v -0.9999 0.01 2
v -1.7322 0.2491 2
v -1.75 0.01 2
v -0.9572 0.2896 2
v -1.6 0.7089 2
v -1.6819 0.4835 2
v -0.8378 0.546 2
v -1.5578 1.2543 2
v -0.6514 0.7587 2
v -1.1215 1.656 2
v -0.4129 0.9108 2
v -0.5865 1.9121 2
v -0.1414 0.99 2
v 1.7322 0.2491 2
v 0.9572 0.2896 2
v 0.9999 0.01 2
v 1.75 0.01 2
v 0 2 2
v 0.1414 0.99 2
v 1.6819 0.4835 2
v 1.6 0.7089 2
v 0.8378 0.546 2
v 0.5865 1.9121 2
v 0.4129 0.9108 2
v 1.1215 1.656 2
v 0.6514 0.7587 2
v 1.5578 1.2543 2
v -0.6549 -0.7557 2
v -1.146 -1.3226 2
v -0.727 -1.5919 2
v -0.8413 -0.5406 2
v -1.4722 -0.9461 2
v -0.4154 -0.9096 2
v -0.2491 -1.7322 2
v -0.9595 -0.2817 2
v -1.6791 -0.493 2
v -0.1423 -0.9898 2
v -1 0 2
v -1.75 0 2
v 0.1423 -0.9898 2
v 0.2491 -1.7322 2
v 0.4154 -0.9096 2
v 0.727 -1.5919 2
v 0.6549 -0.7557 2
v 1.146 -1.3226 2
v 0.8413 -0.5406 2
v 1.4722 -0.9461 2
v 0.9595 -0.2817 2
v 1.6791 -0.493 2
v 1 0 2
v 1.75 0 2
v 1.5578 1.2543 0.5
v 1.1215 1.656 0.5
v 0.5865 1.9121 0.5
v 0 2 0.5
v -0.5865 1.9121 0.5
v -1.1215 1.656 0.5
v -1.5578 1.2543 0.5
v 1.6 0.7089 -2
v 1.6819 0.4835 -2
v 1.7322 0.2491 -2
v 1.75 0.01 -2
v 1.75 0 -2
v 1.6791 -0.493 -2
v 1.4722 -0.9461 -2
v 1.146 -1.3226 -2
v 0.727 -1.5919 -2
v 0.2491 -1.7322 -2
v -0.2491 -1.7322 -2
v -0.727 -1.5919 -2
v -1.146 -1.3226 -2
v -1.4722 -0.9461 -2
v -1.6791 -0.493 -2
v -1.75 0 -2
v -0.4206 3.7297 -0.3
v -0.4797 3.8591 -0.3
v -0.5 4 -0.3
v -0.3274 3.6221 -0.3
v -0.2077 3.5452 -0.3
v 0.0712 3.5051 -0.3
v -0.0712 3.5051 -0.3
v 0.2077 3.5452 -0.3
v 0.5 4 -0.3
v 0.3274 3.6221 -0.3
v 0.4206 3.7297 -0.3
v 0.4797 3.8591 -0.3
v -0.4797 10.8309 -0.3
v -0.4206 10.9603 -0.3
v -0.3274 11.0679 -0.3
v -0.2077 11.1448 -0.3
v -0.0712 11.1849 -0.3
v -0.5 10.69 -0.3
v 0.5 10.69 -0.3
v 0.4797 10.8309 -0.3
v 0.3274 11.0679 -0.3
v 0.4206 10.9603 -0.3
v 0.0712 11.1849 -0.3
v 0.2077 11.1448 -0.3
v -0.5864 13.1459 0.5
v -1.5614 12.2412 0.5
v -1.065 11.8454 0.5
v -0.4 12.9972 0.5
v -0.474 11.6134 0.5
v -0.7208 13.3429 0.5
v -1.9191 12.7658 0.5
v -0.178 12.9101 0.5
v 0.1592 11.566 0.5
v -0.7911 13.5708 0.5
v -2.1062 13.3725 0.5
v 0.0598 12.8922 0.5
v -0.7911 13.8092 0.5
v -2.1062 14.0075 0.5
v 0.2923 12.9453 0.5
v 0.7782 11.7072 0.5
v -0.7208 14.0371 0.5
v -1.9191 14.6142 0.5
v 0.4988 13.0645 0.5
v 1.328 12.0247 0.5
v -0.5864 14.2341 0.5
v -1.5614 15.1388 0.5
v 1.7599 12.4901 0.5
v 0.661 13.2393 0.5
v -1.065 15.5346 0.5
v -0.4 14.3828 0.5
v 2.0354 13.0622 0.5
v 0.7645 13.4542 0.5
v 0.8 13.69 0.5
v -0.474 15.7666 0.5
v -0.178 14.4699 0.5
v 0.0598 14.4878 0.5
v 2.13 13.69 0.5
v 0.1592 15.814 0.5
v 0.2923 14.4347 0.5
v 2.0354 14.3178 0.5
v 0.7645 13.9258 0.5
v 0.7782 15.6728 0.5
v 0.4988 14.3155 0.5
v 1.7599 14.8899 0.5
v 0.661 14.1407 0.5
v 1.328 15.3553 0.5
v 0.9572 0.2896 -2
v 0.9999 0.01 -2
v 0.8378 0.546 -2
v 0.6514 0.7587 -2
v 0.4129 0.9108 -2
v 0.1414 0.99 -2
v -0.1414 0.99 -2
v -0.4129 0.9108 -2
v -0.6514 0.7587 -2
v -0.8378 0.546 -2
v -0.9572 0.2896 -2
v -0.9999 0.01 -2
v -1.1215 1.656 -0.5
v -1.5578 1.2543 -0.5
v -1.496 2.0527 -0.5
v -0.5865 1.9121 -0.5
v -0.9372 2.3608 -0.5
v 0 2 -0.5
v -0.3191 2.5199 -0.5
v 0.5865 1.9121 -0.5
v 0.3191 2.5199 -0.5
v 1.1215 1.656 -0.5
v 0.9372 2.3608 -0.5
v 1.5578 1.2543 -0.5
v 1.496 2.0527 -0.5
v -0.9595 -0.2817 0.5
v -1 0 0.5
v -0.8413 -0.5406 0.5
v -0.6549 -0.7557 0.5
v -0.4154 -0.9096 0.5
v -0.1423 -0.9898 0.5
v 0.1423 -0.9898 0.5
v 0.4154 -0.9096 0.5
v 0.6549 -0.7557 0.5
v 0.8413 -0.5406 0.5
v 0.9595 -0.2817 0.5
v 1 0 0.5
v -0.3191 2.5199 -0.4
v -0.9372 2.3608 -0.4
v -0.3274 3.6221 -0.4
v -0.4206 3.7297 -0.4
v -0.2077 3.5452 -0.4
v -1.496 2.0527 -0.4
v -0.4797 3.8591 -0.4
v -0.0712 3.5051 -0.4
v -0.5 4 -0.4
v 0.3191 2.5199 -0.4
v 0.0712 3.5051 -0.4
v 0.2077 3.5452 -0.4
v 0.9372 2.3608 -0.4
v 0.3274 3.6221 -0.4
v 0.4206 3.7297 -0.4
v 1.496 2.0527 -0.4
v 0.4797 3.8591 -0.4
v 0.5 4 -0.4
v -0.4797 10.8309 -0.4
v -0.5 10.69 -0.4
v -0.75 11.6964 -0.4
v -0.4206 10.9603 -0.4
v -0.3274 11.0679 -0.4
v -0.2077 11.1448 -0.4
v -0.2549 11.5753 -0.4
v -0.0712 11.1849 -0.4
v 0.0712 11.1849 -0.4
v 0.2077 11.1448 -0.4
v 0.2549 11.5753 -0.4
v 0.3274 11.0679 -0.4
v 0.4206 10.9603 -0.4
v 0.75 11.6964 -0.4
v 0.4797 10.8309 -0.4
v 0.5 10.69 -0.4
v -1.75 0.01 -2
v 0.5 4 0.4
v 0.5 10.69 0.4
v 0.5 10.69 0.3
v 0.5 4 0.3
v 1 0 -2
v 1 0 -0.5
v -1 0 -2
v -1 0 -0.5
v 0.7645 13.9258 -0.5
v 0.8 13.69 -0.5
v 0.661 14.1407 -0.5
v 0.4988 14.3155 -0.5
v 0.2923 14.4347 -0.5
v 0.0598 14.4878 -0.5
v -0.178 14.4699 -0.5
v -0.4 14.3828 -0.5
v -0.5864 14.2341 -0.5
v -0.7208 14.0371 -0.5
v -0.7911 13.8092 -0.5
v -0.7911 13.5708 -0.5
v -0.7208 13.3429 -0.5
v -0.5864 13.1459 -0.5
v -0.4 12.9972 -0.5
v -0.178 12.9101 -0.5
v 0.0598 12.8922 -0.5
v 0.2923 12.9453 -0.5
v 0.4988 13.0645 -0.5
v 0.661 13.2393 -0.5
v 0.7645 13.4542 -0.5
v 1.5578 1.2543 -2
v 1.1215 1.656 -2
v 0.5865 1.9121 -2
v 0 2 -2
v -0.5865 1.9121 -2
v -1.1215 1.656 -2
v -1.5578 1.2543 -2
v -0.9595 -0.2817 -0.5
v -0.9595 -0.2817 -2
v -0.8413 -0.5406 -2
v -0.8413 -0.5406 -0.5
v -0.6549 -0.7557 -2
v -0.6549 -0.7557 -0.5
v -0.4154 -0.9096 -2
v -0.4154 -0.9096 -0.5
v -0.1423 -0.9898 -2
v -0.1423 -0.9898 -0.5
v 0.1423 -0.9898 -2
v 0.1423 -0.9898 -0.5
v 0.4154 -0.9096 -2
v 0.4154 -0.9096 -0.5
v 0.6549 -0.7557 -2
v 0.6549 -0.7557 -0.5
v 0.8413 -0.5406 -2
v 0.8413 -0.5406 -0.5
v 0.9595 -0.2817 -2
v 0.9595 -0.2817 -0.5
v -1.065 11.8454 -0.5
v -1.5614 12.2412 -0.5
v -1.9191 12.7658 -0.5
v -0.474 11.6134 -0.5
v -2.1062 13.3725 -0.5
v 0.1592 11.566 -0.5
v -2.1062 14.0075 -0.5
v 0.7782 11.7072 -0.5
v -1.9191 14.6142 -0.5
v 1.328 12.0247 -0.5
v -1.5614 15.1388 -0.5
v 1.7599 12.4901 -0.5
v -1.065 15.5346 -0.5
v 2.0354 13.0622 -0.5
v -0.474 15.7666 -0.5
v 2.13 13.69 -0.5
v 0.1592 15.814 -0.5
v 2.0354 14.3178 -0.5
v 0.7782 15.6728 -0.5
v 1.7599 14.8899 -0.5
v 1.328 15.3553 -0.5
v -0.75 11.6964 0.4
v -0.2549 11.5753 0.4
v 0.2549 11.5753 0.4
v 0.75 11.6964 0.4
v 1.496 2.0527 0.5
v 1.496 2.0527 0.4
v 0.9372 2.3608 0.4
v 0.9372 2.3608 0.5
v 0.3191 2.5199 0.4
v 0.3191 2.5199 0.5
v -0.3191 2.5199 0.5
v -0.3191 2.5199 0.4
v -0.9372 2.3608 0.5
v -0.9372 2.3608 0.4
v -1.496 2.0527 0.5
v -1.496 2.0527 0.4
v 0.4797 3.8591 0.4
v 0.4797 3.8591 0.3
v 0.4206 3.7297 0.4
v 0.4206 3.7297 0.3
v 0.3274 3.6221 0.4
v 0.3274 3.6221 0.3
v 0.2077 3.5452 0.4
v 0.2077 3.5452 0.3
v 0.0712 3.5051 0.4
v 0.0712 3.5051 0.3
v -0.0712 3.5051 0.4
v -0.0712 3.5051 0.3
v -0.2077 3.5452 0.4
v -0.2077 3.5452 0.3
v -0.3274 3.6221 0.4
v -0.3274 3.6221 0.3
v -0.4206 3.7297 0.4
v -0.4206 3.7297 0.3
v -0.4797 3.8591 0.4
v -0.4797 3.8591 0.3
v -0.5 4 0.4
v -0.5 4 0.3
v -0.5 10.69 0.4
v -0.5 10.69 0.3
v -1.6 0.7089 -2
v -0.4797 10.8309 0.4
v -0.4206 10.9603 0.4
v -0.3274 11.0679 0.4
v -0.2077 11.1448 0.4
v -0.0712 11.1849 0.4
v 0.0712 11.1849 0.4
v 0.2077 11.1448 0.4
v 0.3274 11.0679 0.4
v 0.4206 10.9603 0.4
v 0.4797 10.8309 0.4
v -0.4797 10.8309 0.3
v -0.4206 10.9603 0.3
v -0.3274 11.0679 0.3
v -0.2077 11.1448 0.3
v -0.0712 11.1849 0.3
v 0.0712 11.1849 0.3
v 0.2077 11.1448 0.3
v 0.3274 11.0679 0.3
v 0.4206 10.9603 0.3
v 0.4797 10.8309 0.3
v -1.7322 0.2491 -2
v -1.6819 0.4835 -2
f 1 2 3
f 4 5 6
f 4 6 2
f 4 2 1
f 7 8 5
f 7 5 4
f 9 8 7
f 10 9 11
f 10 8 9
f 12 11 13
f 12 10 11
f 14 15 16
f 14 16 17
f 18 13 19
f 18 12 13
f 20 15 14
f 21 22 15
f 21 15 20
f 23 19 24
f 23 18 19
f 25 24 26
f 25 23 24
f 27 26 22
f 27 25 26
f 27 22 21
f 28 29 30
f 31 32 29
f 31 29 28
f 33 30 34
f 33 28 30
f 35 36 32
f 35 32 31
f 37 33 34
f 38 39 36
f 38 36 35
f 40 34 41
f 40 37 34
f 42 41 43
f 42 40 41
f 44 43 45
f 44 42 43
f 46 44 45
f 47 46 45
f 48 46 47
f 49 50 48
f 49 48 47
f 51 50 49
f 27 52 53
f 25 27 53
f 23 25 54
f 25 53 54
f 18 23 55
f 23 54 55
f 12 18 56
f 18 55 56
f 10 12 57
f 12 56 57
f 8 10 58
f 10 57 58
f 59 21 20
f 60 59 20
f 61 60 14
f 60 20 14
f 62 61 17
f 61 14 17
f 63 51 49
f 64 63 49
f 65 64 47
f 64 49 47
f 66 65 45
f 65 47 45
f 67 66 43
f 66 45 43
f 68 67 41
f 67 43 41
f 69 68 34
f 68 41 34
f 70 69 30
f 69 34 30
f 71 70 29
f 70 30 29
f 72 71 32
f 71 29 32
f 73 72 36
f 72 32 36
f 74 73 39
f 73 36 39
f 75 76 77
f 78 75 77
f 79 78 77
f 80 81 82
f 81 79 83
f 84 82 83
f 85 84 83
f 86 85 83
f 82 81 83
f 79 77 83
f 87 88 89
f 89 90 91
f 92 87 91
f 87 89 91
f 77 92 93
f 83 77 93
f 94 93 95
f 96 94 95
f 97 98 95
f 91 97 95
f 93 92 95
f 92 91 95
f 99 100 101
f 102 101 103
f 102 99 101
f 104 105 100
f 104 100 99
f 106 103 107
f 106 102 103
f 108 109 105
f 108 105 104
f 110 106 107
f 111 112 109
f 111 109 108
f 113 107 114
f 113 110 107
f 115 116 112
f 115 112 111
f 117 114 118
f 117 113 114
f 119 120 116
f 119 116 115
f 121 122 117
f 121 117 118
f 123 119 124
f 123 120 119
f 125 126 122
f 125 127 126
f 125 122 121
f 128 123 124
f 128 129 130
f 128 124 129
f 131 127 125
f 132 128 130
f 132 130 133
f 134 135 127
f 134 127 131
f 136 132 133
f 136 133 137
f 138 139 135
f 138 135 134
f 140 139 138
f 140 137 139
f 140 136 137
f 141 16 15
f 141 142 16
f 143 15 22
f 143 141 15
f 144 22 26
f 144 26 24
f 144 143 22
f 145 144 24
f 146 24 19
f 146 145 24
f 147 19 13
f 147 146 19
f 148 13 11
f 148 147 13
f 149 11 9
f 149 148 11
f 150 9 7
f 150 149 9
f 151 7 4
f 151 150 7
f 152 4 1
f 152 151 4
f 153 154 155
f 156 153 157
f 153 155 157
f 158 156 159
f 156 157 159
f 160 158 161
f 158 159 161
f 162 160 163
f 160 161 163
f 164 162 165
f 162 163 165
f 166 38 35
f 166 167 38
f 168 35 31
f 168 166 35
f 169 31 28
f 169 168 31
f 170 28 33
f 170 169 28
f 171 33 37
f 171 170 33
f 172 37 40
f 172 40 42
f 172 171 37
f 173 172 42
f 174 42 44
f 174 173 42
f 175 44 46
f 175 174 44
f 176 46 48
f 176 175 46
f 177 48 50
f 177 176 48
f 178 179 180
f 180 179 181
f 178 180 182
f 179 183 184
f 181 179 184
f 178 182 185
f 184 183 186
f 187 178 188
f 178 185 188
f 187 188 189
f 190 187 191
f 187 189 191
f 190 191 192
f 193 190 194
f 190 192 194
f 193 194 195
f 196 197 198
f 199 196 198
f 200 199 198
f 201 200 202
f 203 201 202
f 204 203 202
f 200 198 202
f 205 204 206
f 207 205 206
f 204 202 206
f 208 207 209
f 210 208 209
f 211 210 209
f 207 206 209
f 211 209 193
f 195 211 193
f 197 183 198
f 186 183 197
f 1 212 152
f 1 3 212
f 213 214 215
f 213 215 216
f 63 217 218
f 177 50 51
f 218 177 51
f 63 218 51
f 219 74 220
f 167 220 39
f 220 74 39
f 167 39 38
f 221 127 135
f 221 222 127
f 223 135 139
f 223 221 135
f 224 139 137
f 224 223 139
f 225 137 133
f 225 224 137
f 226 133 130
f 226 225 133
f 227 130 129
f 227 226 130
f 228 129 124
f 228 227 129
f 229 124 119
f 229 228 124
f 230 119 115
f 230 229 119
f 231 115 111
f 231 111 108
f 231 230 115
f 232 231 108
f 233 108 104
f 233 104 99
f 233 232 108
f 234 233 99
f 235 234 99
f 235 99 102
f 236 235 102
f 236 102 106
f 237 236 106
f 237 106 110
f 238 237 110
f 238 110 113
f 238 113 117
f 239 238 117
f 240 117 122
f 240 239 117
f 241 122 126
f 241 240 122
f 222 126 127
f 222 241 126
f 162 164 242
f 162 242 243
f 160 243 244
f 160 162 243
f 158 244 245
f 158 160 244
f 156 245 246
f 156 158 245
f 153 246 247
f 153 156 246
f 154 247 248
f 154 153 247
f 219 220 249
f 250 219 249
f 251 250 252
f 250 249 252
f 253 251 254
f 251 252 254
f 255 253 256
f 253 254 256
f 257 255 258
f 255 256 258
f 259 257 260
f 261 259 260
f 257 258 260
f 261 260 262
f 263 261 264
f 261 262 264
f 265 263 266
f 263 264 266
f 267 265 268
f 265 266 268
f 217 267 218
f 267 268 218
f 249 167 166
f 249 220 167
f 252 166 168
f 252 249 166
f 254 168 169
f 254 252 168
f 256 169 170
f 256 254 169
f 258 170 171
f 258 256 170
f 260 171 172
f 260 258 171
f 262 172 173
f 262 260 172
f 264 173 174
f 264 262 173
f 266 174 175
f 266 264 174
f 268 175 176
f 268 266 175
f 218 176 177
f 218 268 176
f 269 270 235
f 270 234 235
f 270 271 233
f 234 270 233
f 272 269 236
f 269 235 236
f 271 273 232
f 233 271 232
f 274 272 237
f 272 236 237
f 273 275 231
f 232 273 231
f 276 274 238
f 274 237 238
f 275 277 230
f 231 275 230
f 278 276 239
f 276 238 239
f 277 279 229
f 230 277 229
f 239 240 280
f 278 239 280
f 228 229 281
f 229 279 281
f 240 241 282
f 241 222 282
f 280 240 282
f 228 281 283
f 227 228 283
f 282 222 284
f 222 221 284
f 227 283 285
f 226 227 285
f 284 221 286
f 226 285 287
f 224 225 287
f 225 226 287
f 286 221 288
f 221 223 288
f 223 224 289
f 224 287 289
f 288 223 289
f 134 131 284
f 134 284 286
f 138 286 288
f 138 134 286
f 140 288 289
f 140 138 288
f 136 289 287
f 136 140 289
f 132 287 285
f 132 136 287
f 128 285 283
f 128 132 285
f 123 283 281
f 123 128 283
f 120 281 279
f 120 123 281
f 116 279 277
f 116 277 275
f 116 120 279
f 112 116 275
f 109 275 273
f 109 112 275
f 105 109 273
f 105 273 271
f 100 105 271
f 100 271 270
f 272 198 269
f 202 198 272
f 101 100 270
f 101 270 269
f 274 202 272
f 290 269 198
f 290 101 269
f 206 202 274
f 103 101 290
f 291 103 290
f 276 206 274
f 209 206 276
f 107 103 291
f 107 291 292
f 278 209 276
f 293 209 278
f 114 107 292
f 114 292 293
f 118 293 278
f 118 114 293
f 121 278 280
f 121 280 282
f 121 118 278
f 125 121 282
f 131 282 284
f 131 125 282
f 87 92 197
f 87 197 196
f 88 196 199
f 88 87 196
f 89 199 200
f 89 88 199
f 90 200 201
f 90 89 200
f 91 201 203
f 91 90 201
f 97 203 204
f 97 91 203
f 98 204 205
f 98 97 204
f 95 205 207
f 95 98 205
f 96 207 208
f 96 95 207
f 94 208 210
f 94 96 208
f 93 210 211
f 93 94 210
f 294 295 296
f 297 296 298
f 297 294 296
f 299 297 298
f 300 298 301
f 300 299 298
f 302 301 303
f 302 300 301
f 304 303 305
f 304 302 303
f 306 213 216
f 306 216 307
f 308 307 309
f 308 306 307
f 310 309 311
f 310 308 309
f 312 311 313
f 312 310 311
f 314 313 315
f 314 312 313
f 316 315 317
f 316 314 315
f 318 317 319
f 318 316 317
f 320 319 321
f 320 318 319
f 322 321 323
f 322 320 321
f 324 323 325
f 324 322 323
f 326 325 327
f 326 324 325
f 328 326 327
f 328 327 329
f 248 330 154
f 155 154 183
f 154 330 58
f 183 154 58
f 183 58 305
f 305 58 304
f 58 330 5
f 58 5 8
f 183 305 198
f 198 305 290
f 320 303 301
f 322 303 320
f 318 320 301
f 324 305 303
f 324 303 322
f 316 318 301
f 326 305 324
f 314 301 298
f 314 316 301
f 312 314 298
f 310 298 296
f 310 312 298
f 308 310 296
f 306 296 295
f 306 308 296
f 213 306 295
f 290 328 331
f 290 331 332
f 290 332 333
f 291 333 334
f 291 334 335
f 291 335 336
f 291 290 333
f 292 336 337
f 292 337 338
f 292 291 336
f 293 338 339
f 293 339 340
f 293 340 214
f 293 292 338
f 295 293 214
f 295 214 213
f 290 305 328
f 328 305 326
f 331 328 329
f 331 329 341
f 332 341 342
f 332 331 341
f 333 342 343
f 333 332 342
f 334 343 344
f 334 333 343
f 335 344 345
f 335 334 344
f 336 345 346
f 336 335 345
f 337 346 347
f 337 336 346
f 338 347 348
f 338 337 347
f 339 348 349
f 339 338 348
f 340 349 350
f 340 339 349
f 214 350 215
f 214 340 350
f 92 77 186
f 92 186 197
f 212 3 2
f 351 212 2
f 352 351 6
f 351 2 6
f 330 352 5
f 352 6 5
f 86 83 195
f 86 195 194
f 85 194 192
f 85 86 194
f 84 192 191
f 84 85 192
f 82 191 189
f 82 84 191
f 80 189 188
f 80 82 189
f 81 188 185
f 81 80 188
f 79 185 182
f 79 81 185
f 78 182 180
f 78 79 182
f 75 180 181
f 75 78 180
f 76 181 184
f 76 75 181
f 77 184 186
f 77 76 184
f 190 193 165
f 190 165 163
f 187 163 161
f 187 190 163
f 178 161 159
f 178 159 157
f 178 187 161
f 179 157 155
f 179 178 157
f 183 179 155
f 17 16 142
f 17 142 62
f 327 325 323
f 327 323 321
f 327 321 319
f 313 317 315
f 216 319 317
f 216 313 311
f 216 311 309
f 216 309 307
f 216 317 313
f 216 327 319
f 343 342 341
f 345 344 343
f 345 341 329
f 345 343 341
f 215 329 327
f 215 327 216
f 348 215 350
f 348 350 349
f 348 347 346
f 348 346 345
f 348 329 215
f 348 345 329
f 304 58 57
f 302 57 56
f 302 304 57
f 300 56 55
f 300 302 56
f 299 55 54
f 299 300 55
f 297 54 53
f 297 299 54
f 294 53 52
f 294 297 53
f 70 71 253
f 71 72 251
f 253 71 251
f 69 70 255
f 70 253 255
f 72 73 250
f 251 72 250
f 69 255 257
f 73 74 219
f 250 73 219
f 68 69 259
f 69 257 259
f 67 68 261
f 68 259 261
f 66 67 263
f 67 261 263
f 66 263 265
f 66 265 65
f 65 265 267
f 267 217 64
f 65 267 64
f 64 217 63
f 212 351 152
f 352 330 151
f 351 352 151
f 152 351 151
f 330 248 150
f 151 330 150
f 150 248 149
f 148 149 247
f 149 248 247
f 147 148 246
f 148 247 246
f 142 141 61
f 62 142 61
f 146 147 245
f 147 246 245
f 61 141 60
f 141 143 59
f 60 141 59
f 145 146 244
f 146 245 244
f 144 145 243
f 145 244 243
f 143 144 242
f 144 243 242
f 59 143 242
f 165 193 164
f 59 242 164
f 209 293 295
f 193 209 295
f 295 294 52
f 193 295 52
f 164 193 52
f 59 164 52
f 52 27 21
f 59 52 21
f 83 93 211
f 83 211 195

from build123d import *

# Parameters (mm, degrees)
SKETCH2_R                = 2.13
SKETCH2_R_2              = 0.8
BOSS_EXTRUDE1_DEPTH      = 0.5
SKETCH2_R_3              = 2.54
SKETCH2_R_4              = 1
BOSS_EXTRUDE1_2_DEPTH    = 0.5
BOSS_EXTRUDE2_DEPTH      = 0.4
BOSS_EXTRUDE3_DEPTH      = 0.3
BOSS_EXTRUDE5_DEPTH      = 1.5
BOSS_EXTRUDE5_DEPTH_BACK = 2.5
SKETCH3_R                = 2
SKETCH3_R_2              = 1
CUT_EXTRUDE1_DEPTH       = 30.75
SKETCH5_W                = 8.281122101
SKETCH5_H                = 0.01
CUT_EXTRUDE2_DEPTH       = 30.75


with BuildPart() as part:
    # Sketch2 → Boss-Extrude1 (new, symmetric)
    with BuildSketch(Plane.XY):
        with Locations((0, 13.69)):
            Circle(SKETCH2_R)
        with Locations((0, 13.69)):
            Circle(SKETCH2_R_2, mode=Mode.SUBTRACT)
    extrude(amount=BOSS_EXTRUDE1_DEPTH, both=True)



with BuildPart() as body_2:
    # Sketch2 → Boss-Extrude1 2 (new, symmetric)
    with BuildSketch(Plane.XY):
        Circle(SKETCH2_R_3)
        Circle(SKETCH2_R_4, mode=Mode.SUBTRACT)
    extrude(amount=BOSS_EXTRUDE1_2_DEPTH, both=True)


with BuildPart() as part_1:
    add(part.part)

    add(body_2.part)  # Boss-Extrude2 merges body 2
    # Sketch2<3> → Boss-Extrude2 (add, symmetric)
    with BuildSketch(Plane.XY):
        with BuildLine():
            ThreePointArc((0.75, 11.696410273), (0, 11.56), (-0.75, 11.696410273))
            Line((-0.75, 11.696410273), (-1.65, 1.931087776))
            ThreePointArc((-1.65, 1.931087776), (0, 2.54), (1.65, 1.931087776))
            Line((1.65, 1.931087776), (0.75, 11.696410273))
        make_face()
        with BuildLine():
            ThreePointArc((-0.5, 10.69), (0, 11.19), (0.5, 10.69))
            Line((0.5, 10.69), (0.5, 4))
            ThreePointArc((0.5, 4), (0, 3.5), (-0.5, 4))
            Line((-0.5, 4), (-0.5, 10.69))
        make_face(mode=Mode.SUBTRACT)
    extrude(amount=BOSS_EXTRUDE2_DEPTH, both=True)

    # Sketch2<4> → Boss-Extrude3 (add, symmetric)
    with BuildSketch(Plane.XY):
        with BuildLine():
            Line((0.5, 4), (0.5, 10.69))
            ThreePointArc((0.5, 10.69), (0, 11.19), (-0.5, 10.69))
            Line((-0.5, 10.69), (-0.5, 4))
            ThreePointArc((-0.5, 4), (0, 3.5), (0.5, 4))
        make_face()
    extrude(amount=BOSS_EXTRUDE3_DEPTH, both=True)

    # Sketch3 → Boss-Extrude5 (add, two sides: drawn at the far end of the back side and taken through both)
    with BuildSketch(Plane.XY.offset(0.5).offset(-BOSS_EXTRUDE5_DEPTH_BACK)):
        Circle(SKETCH3_R)
        Circle(SKETCH3_R_2, mode=Mode.SUBTRACT)
    extrude(amount=BOSS_EXTRUDE5_DEPTH + BOSS_EXTRUDE5_DEPTH_BACK)

    # Sketch4 → Cut-Extrude1 (cut, symmetric)
    with BuildSketch(Plane.XY):
        with BuildLine():
            Line((-0.75, 11.696410273), (-2.90290804, 1.955281287))
            ThreePointArc((-2.90290804, 1.955281287), (0, -3.5), (2.90290804, 1.955281287))
            Line((2.90290804, 1.955281287), (0.75, 11.696410273))
            Line((0.75, 11.696410273), (1.6, 0.708872344))
            ThreePointArc((1.6, 0.708872344), (0, -1.75), (-1.6, 0.708872344))
            Line((-1.6, 0.708872344), (-0.75, 11.696410273))
        make_face()
    extrude(amount=CUT_EXTRUDE1_DEPTH, both=True, mode=Mode.SUBTRACT)

    # Sketch5 → Cut-Extrude2 (cut, symmetric)
    with BuildSketch(Plane.XY):
        with Locations((-0.041360672, 0.005)):
            Rectangle(SKETCH5_W, SKETCH5_H)
    extrude(amount=CUT_EXTRUDE2_DEPTH, both=True, mode=Mode.SUBTRACT)


with BuildPart() as cut_extrude2_piece_1:
    # of the separate pieces the step leaves, piece 1, a body of its own (cut_extrude2_pieces)
    add(part_1.part.solids().sort_by_distance((1.496043311, 2.052670069, -0.5))[0])


with BuildPart() as cut_extrude2_piece_2:
    # of the separate pieces the step leaves, piece 2, a body of its own (cut_extrude2_pieces)
    add(part_1.part.solids().sort_by_distance((-1.75, 0, -2))[0])


solid = Compound([cut_extrude2_piece_1.part, cut_extrude2_piece_2.part])
